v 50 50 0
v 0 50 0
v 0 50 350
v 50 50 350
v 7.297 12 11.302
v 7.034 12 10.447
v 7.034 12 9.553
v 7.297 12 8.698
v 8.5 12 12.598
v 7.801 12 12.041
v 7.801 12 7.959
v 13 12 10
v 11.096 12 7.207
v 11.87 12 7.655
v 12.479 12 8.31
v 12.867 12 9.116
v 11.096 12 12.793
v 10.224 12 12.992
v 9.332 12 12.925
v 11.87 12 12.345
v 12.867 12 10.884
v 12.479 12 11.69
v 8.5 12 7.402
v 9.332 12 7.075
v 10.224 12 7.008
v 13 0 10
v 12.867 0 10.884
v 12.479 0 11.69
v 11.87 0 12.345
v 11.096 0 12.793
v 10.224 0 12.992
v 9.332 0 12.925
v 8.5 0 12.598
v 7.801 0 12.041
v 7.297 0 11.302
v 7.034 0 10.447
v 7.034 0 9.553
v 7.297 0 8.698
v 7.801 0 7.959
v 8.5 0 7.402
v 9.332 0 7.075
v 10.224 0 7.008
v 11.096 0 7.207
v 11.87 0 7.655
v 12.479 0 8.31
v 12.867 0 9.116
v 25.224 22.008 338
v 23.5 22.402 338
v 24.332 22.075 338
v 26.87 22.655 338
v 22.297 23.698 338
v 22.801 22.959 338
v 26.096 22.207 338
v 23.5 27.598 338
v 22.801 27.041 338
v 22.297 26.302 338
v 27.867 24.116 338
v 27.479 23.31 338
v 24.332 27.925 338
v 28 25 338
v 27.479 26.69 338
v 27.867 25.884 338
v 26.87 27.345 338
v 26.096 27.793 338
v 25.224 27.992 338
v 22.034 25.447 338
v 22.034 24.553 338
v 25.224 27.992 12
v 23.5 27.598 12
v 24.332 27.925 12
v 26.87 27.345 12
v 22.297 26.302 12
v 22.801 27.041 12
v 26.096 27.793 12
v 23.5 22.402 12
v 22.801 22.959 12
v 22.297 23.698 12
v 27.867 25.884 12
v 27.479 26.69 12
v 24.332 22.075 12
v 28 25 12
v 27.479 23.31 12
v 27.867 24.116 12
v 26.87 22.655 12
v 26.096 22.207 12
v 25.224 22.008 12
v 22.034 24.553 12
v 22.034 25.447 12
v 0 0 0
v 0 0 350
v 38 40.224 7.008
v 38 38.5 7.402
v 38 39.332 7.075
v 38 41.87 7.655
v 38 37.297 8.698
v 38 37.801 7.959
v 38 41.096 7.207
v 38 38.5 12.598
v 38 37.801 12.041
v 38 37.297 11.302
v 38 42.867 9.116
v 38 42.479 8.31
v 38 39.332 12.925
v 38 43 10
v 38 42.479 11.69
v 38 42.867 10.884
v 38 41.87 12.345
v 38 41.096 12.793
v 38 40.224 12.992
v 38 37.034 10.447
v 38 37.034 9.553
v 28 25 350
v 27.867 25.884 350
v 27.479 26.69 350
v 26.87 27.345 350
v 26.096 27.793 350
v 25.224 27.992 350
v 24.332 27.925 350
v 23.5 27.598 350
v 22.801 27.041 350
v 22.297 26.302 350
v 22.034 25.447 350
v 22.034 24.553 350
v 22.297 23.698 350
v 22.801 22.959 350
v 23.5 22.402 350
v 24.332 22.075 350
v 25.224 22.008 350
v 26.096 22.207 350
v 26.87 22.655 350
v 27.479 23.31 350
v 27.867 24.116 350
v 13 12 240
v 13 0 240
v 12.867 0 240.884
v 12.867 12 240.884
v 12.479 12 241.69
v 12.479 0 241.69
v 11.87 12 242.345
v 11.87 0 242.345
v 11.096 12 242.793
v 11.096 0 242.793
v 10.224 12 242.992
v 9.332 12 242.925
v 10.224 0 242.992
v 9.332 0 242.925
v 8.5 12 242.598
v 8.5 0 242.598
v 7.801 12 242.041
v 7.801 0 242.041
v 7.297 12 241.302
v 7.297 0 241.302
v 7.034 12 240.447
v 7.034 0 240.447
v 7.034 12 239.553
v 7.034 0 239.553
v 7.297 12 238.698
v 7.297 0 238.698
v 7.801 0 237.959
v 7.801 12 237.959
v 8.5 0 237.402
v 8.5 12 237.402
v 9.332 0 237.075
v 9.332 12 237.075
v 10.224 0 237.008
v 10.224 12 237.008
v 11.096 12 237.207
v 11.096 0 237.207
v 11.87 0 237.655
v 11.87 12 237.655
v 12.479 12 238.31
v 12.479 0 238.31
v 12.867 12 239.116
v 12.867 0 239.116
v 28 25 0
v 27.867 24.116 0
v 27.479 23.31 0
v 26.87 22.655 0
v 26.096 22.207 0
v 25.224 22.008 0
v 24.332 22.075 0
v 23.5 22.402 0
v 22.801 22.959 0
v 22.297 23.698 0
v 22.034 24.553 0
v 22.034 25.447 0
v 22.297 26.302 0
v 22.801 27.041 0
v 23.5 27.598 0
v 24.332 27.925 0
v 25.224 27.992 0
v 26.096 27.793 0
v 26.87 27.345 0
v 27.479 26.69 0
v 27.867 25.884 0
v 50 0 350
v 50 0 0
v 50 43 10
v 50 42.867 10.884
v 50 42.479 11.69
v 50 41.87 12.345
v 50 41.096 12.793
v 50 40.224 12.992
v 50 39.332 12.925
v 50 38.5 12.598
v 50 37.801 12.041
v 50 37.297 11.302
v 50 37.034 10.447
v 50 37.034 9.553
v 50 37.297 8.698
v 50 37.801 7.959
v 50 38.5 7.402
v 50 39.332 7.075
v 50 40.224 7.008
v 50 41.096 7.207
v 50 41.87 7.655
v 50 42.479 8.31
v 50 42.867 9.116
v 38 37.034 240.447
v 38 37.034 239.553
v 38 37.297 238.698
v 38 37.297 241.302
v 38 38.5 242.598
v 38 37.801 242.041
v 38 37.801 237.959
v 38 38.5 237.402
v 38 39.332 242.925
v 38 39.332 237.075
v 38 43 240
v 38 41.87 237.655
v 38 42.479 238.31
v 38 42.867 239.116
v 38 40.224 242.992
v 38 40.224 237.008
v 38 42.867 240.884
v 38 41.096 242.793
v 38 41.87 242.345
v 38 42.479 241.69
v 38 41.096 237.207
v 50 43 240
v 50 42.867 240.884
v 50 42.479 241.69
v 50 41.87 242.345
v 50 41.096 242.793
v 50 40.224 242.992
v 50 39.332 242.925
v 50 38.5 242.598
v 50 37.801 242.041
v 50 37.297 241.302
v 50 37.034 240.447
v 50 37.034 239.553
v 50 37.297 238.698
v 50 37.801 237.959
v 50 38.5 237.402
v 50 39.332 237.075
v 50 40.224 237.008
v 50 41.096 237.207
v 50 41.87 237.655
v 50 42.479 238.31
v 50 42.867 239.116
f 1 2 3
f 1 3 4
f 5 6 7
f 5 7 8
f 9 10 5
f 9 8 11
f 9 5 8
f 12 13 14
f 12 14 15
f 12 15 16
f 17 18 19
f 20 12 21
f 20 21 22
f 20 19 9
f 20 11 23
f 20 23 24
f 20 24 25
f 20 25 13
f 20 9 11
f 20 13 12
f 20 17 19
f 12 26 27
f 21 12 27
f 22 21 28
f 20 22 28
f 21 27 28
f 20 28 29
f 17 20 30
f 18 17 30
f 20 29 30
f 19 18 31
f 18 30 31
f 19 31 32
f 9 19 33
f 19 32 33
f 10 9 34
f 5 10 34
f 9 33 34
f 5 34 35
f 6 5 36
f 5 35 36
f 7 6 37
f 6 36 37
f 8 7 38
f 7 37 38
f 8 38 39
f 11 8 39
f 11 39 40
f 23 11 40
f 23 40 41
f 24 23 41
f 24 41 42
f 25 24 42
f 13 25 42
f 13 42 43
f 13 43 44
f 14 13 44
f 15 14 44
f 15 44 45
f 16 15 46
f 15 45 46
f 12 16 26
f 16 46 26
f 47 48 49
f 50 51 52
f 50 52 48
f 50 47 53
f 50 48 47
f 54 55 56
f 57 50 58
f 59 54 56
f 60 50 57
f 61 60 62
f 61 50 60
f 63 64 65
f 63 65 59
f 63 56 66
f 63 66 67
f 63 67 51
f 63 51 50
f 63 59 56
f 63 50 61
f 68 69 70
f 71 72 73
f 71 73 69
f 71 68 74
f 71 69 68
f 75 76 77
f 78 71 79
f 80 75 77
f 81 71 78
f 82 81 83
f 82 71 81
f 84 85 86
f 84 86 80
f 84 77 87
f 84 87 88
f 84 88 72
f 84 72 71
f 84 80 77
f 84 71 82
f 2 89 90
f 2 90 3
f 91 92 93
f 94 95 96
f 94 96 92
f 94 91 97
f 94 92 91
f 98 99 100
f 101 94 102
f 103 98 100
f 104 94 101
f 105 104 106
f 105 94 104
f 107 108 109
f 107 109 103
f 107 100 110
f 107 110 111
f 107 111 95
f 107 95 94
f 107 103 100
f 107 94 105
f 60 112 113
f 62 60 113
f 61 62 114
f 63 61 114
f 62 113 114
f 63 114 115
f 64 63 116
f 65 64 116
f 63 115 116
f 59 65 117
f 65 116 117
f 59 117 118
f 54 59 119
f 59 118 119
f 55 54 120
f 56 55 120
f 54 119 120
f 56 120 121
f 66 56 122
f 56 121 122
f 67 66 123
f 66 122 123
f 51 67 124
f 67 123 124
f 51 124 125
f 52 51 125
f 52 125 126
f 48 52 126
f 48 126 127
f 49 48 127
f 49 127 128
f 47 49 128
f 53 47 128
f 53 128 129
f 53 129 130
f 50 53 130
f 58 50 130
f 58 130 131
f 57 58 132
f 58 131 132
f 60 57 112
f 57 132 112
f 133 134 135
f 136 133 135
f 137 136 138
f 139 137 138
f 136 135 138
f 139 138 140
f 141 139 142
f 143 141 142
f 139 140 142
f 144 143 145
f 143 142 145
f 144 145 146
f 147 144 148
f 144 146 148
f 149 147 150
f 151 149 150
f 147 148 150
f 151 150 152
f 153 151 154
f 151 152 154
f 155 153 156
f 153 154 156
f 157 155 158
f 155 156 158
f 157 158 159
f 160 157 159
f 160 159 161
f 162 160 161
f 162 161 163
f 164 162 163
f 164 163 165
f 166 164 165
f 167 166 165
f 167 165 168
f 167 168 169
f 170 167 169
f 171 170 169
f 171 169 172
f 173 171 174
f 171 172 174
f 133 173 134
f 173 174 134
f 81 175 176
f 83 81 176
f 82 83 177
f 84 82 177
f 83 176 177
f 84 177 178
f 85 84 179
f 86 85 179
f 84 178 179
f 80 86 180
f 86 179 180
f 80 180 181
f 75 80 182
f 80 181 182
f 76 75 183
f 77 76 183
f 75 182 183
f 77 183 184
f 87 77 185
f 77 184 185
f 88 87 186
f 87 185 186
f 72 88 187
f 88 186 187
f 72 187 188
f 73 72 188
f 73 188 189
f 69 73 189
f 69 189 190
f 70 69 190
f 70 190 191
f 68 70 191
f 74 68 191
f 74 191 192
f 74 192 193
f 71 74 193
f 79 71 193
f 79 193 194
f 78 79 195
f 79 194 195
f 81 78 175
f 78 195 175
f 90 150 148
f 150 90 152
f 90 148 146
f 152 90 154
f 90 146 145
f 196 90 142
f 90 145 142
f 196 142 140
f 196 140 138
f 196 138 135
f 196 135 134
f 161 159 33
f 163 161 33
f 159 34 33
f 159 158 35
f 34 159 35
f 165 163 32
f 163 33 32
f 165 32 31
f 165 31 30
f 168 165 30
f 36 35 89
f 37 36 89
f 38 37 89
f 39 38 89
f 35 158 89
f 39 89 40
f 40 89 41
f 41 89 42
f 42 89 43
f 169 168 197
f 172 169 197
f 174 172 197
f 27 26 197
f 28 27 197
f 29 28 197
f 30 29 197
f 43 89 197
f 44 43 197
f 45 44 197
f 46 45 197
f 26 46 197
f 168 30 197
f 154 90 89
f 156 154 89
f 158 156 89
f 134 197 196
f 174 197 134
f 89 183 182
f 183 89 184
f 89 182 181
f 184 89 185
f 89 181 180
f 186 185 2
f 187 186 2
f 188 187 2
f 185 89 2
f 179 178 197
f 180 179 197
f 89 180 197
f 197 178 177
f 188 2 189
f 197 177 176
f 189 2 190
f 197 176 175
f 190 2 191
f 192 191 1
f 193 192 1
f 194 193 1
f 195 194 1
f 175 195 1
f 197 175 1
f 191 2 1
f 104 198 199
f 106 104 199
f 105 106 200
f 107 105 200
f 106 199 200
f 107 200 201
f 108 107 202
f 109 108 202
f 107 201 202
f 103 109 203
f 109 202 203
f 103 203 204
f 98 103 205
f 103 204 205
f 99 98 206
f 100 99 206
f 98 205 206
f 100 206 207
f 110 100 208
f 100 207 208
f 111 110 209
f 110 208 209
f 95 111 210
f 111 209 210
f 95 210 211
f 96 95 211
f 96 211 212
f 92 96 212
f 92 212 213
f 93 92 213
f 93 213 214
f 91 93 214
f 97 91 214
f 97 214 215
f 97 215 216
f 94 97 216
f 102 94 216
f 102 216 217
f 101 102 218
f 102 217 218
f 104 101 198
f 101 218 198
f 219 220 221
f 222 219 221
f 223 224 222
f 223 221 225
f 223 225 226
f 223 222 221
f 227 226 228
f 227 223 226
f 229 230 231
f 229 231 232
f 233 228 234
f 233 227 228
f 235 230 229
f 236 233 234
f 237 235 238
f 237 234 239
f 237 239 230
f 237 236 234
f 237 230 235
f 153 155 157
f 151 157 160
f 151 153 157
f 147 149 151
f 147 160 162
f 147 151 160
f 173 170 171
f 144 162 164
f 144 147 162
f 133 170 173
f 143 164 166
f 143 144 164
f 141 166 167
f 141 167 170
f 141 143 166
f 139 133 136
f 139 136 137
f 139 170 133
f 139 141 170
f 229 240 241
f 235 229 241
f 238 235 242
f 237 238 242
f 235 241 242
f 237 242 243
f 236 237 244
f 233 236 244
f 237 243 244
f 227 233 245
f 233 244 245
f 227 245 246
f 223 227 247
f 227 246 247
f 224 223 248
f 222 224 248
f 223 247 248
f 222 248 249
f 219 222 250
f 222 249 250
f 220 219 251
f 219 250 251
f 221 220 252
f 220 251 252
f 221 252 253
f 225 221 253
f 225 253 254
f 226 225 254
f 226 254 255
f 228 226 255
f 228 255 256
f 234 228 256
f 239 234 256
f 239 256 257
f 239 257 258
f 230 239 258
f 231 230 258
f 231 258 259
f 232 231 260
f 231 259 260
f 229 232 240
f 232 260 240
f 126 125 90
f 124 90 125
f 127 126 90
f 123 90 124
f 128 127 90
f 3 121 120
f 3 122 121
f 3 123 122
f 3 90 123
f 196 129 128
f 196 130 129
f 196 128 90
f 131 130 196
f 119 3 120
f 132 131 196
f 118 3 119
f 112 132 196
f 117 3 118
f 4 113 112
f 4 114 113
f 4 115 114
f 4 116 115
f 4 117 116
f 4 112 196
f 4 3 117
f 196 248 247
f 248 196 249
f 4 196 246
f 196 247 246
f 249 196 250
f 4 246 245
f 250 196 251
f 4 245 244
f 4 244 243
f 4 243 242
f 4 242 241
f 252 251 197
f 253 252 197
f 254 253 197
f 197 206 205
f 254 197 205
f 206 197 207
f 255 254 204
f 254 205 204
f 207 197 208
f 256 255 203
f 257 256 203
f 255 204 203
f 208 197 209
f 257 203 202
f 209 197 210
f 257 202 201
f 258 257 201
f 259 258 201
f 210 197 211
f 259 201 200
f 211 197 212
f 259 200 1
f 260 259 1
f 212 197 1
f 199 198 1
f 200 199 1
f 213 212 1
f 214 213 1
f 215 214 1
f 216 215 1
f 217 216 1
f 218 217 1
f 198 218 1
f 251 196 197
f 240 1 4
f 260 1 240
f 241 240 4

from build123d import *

# Parameters (mm, degrees)
F0_W     = 50
F0_H     = 50
F1_DEPTH = 350
F2_R     = 3
F3_DEPTH = 12
F4_R     = 3
F5_DEPTH = 12
F6_R     = 3
F7_DEPTH = 12
F8_R     = 3
F9_DEPTH = 12


with BuildPart() as f1:
    # F0 (on Top) → F1 (new body)
    with BuildSketch(Plane.XY):
        with Locations((25, 25)):
            Rectangle(F0_W, F0_H)
    extrude(amount=F1_DEPTH)

    # F2 (on face) → F3 (cut)
    with BuildSketch(Plane.XY.offset(350)):
        with Locations((25, 25)):
            Circle(F2_R)
    extrude(amount=-F3_DEPTH, mode=Mode.SUBTRACT)

    # F4 (on face) → F5 (cut)
    with BuildSketch(Plane.XZ):
        with Locations((10, 240)):
            Circle(F4_R)
        with Locations((10, 10)):
            Circle(F4_R)
    extrude(amount=-F5_DEPTH, mode=Mode.SUBTRACT)

    # F6 (on face) → F7 (cut)
    with BuildSketch(Plane.YZ.offset(50)):
        with Locations((40, 240)):
            Circle(F6_R)
        with Locations((40, 10)):
            Circle(F6_R)
    extrude(amount=-F7_DEPTH, mode=Mode.SUBTRACT)

    # F8 (on face) → F9 (cut)
    with BuildSketch(Plane(origin=(0, 0, 0), x_dir=(1, 0, 0), z_dir=(0, 0, -1))):
        with Locations((25, -25)):
            Circle(F8_R)
    extrude(amount=-F9_DEPTH, mode=Mode.SUBTRACT)


solid = f1.part
